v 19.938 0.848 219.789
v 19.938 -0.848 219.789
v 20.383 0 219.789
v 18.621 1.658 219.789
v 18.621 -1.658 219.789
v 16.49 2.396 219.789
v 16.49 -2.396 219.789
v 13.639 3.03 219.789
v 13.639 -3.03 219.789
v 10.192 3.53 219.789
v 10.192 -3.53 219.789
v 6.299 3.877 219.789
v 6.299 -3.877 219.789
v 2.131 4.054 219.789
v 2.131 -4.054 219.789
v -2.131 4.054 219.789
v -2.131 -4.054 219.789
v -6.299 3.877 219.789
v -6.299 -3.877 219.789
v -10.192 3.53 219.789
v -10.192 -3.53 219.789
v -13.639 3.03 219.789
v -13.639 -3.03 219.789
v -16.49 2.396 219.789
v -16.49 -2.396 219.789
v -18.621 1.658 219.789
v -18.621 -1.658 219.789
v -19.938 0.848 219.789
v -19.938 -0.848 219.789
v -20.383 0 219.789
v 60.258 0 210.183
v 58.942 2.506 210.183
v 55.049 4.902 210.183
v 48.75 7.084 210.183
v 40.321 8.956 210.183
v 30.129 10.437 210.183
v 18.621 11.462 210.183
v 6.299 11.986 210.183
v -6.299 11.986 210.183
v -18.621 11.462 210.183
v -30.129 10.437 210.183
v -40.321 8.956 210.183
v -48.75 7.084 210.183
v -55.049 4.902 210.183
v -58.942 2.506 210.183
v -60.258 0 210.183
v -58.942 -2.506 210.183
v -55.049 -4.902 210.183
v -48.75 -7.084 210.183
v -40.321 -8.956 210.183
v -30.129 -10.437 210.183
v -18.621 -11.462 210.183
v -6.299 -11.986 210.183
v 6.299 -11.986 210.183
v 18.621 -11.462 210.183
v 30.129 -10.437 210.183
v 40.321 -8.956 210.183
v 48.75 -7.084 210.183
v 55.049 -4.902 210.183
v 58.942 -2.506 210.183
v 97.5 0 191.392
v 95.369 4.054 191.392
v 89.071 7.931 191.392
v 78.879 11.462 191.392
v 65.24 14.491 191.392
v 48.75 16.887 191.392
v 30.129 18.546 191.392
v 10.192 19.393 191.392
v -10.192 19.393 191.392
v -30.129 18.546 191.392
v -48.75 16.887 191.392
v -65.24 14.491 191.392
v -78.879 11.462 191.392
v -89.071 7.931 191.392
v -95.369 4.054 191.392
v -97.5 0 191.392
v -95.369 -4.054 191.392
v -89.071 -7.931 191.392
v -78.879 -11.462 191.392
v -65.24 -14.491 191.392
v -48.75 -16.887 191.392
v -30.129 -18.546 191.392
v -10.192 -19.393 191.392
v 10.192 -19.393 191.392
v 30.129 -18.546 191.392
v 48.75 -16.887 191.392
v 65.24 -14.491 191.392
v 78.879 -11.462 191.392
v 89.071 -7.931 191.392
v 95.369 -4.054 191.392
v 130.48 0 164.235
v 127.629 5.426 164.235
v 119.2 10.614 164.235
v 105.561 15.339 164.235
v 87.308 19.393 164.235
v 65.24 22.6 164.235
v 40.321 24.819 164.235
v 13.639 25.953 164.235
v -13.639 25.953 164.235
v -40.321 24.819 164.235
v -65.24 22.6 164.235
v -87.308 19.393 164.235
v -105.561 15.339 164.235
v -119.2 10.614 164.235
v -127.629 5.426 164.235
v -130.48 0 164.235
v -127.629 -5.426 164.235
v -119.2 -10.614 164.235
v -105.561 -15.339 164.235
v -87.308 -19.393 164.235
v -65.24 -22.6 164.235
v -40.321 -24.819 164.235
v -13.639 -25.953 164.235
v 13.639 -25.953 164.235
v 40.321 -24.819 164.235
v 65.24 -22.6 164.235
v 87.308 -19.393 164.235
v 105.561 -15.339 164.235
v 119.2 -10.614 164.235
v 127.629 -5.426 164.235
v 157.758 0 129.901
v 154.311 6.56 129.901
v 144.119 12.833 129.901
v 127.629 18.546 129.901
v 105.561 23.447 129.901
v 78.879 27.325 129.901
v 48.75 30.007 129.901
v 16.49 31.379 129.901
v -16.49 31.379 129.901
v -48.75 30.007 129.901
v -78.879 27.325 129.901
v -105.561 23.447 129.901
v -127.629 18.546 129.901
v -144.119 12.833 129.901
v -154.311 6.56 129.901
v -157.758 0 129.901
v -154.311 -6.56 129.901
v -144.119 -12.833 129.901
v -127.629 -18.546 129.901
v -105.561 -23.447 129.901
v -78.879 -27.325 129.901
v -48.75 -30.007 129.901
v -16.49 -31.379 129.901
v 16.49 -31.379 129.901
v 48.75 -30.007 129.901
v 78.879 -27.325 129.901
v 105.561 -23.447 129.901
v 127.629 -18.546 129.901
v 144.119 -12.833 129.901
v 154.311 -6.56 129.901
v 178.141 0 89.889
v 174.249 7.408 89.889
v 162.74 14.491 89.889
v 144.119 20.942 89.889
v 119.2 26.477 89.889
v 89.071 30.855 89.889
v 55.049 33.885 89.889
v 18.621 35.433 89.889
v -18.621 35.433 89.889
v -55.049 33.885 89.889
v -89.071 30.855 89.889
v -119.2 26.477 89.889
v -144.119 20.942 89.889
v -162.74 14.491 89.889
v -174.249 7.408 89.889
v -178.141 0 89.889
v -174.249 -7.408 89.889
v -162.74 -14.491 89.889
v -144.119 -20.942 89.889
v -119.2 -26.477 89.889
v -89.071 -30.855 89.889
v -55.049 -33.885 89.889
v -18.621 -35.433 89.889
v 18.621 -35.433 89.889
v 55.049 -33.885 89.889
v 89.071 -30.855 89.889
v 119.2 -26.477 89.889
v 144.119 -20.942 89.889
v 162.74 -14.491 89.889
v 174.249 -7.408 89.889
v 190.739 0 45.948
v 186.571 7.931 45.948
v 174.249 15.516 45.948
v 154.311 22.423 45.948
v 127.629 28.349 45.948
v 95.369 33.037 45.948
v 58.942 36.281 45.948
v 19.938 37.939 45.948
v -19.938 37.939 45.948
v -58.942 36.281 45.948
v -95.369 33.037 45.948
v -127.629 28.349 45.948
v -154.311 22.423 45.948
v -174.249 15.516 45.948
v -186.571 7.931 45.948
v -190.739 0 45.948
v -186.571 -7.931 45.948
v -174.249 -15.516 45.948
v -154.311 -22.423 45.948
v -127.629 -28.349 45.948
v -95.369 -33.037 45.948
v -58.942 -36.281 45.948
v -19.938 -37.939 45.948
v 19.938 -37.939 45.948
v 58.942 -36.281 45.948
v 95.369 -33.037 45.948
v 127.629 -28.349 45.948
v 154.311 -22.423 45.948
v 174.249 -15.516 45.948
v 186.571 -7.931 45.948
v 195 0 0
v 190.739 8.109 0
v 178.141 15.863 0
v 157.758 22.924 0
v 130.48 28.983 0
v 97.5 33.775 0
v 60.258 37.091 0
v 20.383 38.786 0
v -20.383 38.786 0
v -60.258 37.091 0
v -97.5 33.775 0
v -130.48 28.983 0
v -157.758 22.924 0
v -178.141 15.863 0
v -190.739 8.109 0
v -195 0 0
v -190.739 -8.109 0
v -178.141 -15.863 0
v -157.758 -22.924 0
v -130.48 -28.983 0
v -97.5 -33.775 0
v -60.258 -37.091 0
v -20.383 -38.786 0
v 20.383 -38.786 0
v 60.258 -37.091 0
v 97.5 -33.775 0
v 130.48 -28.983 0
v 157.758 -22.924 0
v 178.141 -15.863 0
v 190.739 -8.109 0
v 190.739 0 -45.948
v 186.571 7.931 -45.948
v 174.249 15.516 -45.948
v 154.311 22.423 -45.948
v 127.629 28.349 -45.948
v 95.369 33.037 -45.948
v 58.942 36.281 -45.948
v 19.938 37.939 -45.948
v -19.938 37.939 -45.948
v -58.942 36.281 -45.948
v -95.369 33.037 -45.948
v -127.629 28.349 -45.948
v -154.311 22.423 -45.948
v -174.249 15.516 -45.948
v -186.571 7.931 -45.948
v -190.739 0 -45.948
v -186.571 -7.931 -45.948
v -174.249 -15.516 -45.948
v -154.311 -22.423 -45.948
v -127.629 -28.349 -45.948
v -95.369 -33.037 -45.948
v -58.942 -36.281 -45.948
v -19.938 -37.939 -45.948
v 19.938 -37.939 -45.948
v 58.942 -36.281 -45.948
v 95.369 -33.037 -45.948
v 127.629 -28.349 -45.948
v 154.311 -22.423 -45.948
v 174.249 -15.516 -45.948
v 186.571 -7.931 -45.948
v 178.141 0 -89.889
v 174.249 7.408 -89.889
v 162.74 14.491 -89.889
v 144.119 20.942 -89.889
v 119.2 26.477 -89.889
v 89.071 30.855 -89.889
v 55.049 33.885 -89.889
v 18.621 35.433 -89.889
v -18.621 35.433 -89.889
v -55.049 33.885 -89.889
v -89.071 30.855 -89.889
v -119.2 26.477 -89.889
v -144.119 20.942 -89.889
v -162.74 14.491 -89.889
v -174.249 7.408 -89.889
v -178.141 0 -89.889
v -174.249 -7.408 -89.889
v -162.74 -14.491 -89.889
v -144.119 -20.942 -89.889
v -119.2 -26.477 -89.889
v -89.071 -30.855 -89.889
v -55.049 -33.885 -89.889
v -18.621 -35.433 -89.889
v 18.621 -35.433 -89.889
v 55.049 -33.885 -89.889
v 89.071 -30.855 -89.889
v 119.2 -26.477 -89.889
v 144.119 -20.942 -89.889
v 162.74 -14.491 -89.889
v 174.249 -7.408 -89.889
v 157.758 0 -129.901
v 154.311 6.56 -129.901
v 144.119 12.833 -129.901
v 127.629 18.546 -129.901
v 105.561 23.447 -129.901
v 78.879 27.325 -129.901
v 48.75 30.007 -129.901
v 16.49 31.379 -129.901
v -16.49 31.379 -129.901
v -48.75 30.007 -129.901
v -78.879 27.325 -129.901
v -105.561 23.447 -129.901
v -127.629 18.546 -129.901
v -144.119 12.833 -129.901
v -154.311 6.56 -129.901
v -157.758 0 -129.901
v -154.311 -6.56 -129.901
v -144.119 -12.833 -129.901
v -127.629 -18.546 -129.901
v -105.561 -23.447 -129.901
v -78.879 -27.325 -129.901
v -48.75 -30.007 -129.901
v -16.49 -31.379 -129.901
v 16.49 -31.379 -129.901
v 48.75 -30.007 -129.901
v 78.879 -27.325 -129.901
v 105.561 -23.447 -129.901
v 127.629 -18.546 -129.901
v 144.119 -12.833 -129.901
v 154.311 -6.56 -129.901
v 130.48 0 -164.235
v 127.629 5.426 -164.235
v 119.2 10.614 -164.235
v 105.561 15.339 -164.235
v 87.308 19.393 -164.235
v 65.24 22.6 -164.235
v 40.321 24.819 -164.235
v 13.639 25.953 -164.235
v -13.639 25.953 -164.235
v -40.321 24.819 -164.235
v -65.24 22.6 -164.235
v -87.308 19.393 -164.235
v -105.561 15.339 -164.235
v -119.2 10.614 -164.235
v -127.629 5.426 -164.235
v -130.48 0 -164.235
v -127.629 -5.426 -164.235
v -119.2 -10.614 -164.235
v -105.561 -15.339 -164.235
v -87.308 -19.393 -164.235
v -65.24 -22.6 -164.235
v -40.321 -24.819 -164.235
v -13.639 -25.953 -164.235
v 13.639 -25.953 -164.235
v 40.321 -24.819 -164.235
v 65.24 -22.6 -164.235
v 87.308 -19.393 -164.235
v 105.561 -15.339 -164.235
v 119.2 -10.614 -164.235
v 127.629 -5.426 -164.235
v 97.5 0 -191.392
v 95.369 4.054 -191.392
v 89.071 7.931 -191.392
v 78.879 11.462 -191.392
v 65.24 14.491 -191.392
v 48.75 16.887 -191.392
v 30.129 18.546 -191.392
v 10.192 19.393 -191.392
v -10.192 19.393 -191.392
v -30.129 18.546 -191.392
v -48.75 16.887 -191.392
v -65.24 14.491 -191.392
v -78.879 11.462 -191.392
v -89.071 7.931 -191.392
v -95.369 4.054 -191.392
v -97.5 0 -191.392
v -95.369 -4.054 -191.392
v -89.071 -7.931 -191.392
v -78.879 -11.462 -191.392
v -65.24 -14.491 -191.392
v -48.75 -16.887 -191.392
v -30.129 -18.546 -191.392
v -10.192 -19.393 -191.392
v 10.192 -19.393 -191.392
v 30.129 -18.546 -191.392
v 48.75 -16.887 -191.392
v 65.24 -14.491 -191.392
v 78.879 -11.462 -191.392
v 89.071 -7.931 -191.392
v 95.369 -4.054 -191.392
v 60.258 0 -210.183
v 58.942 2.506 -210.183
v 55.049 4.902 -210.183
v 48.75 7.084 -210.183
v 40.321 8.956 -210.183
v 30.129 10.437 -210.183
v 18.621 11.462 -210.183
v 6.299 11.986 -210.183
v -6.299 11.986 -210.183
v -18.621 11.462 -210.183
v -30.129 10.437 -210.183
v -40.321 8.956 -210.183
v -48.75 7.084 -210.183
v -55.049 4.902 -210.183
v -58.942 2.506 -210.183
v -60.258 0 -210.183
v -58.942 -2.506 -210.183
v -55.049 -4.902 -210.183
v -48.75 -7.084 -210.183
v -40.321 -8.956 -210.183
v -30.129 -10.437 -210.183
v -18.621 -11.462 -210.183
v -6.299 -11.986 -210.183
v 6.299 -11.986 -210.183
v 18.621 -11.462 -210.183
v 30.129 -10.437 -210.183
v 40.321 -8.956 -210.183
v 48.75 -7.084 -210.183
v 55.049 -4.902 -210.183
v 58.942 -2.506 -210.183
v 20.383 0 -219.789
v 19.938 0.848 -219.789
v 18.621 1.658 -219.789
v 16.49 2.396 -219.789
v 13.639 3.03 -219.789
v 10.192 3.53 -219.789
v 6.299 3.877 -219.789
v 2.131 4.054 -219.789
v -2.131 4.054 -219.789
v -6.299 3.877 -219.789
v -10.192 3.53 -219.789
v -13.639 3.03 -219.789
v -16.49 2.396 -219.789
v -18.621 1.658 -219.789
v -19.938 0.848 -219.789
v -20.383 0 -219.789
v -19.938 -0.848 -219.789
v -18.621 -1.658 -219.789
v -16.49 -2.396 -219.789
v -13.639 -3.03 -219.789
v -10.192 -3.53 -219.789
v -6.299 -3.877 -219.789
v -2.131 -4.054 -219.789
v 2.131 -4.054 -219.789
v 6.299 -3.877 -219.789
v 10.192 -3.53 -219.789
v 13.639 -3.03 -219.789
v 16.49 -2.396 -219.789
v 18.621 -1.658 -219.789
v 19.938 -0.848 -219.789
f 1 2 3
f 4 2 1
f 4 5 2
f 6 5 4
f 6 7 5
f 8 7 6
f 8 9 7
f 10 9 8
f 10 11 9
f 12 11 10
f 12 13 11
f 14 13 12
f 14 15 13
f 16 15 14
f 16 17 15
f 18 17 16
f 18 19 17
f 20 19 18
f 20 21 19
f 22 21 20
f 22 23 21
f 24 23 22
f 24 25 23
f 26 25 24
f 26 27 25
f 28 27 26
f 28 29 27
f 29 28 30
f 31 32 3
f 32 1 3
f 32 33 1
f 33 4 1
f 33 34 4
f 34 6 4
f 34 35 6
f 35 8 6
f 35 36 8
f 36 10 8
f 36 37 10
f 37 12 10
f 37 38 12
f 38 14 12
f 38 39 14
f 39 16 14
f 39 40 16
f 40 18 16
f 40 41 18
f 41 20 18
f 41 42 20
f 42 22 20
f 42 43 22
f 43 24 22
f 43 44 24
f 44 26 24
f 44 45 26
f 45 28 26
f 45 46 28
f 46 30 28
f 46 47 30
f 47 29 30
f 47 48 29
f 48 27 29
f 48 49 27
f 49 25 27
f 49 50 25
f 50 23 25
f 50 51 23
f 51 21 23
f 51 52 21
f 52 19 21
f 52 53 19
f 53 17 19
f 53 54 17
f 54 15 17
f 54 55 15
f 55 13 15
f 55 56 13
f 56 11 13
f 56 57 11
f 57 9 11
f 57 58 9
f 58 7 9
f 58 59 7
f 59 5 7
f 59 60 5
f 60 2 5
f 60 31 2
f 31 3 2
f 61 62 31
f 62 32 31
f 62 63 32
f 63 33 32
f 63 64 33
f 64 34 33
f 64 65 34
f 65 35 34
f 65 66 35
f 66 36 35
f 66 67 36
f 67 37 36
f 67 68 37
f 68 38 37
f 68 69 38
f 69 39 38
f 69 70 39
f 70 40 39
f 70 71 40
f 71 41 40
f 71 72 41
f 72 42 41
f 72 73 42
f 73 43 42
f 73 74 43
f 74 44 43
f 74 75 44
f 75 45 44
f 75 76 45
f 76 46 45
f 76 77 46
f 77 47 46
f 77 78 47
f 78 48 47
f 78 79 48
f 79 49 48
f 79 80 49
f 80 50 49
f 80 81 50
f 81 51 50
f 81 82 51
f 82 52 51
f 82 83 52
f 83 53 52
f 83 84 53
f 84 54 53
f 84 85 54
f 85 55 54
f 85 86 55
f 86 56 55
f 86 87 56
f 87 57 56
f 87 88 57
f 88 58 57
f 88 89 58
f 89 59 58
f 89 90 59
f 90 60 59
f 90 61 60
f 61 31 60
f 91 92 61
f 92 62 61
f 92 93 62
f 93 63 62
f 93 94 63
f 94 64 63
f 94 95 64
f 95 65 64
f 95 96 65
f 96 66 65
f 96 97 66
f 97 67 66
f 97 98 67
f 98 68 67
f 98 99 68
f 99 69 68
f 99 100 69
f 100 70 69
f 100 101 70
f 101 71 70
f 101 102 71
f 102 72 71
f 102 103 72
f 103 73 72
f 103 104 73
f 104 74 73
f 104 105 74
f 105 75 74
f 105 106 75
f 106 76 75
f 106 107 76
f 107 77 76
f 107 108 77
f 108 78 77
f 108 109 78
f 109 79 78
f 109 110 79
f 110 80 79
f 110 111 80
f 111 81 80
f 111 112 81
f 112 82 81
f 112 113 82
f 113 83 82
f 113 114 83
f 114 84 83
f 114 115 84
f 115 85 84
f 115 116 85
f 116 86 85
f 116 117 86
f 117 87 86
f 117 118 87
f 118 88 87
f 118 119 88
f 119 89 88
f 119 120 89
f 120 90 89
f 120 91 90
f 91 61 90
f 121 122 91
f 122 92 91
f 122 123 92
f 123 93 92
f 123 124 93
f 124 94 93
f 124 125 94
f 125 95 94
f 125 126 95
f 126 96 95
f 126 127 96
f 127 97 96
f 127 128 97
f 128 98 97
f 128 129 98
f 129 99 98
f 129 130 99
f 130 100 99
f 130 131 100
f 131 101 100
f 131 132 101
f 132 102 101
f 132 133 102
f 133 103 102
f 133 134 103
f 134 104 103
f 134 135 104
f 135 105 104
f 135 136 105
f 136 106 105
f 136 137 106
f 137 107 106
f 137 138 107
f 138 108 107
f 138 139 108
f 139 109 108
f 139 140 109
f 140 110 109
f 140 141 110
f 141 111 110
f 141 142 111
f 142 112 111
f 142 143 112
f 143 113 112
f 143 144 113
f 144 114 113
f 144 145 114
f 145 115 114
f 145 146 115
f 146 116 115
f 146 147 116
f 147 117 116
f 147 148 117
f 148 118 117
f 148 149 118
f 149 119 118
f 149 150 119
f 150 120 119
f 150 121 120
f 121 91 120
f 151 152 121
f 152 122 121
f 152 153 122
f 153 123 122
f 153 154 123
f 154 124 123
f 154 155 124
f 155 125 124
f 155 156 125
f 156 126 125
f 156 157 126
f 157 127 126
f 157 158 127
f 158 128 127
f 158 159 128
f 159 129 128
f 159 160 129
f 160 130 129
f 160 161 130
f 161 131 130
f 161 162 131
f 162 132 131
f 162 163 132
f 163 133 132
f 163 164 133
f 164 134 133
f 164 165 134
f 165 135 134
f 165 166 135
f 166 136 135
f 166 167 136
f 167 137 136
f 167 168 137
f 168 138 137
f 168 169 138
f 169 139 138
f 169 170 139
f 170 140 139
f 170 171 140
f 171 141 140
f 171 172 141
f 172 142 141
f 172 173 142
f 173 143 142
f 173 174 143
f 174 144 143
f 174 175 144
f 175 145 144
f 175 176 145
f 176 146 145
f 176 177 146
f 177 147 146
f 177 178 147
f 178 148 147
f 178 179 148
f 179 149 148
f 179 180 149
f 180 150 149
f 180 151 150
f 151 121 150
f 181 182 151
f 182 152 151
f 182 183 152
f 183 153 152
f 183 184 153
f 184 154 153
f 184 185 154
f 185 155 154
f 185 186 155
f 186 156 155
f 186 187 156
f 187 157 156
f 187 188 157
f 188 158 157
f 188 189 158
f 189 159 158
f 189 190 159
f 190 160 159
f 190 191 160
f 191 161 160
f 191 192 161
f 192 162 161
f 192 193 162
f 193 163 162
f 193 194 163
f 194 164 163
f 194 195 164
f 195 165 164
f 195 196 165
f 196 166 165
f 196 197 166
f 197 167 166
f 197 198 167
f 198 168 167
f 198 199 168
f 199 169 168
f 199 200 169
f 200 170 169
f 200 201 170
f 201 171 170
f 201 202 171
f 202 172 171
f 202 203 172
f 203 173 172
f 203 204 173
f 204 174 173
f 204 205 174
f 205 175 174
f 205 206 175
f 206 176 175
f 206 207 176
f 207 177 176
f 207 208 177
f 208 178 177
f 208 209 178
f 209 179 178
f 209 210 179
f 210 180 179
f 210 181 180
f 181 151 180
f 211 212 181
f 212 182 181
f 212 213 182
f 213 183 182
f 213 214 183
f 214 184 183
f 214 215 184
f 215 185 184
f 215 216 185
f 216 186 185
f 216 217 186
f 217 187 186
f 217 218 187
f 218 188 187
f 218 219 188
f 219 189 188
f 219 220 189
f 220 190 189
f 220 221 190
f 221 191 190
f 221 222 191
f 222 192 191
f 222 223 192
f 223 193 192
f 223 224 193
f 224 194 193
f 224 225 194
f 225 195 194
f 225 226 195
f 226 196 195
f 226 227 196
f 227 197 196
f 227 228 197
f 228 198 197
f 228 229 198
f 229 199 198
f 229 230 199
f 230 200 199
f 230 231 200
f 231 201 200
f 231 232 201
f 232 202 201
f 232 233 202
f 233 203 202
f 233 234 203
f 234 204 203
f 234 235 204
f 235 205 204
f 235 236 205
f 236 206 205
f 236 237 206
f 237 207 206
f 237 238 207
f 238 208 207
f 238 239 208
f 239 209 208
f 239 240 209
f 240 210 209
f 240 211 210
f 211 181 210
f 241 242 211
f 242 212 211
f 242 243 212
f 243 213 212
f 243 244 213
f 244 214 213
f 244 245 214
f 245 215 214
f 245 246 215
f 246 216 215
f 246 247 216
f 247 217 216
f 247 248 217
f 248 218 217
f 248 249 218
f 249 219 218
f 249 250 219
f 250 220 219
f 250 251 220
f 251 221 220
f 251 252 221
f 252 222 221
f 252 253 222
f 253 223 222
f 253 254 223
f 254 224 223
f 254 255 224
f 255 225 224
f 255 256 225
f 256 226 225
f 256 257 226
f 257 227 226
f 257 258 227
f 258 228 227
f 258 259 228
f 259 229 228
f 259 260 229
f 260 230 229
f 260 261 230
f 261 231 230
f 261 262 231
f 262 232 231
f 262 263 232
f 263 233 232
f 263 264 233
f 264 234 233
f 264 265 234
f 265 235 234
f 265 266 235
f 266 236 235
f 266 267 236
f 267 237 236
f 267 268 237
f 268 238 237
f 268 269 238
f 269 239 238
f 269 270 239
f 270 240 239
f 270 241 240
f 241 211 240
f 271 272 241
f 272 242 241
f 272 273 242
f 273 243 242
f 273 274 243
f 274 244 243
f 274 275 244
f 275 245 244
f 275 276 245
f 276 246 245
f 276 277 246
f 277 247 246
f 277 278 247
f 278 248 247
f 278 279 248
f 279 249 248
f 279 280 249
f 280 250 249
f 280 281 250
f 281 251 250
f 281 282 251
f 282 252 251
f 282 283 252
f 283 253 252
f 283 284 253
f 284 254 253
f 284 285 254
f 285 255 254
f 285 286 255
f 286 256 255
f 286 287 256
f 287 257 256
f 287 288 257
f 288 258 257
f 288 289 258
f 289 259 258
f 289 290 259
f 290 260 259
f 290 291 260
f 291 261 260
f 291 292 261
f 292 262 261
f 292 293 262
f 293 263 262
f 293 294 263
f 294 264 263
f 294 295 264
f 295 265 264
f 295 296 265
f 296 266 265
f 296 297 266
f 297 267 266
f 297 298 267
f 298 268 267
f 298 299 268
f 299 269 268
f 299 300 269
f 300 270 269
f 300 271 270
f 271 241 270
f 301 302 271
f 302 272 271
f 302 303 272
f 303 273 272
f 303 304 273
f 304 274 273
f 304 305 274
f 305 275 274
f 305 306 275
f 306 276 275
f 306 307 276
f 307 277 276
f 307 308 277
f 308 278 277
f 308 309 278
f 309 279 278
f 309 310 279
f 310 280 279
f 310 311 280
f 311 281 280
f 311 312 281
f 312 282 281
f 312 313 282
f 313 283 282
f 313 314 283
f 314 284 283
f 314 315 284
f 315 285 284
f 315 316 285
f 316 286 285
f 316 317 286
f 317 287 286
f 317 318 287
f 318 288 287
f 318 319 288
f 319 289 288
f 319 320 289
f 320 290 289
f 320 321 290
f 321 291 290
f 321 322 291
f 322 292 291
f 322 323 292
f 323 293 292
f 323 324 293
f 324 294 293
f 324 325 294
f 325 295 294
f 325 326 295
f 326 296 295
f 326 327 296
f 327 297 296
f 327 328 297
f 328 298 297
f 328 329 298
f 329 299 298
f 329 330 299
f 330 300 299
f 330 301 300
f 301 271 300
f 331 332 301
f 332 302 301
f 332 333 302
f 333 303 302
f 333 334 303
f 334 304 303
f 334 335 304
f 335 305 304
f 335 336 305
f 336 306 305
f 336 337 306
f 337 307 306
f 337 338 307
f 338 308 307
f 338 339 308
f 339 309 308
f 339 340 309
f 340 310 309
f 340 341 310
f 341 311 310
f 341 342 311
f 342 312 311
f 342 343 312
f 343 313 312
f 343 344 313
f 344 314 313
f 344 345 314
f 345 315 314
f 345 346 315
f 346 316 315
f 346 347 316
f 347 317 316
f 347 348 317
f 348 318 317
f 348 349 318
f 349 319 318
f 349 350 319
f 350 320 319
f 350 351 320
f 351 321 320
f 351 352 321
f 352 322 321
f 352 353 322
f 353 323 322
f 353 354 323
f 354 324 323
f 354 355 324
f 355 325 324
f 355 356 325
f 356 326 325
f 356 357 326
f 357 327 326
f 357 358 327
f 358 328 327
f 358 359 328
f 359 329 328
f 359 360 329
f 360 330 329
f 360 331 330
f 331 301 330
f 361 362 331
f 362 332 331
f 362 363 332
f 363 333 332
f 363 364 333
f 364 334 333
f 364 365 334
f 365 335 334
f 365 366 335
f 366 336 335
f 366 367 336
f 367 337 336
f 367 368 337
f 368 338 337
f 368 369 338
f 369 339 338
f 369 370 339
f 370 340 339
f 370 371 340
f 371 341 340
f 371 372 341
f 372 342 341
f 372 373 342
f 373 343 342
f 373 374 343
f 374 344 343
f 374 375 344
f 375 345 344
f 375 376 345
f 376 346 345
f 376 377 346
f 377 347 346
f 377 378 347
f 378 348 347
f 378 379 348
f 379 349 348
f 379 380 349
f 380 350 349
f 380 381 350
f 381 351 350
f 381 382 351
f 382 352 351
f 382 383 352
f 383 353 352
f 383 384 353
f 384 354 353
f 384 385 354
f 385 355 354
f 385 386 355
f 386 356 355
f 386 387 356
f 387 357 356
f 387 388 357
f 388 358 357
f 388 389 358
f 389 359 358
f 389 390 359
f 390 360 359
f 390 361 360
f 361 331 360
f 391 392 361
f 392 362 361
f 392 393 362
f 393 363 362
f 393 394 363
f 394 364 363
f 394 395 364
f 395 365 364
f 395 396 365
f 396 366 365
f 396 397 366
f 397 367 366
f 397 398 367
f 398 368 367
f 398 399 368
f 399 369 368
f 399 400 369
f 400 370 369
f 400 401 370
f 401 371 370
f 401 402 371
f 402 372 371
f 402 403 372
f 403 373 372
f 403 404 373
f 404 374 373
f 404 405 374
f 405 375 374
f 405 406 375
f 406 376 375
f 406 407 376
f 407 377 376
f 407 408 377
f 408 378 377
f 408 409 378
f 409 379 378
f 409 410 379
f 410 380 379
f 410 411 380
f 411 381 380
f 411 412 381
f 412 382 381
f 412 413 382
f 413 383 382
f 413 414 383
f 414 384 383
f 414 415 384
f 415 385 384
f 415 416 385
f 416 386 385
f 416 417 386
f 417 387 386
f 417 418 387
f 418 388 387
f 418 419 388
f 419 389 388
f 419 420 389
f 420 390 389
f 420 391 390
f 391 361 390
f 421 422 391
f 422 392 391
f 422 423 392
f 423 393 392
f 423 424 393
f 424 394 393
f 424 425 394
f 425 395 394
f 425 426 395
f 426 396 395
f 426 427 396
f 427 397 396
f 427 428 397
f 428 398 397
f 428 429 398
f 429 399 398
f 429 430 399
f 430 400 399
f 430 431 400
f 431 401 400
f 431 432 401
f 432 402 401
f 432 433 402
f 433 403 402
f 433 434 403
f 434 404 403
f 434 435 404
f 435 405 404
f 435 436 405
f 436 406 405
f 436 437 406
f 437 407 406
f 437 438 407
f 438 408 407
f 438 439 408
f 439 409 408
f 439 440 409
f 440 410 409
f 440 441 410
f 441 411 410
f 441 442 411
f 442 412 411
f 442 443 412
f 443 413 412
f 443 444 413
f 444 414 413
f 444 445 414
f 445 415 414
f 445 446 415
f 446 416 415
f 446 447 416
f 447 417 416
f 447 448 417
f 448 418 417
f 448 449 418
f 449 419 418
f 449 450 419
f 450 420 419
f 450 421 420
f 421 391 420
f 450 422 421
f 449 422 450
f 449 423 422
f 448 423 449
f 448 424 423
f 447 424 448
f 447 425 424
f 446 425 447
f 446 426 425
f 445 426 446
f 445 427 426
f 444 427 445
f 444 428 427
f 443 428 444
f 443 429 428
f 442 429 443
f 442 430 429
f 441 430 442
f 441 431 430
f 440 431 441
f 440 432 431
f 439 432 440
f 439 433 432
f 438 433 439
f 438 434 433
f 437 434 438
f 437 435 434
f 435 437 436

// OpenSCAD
// Generated by SolidPython 1.0.1 on 2020-07-29 00:46:51


scale(v = [15, 3, 17]) {
	sphere(r = 13);
}
/***********************************************
*********      SolidPython code:      **********
************************************************
 
# import packages: SolidPython
from solid import *
from solid.utils import *
from itertools import chain, combinations, permutations


class Resize:

    def __init__(self, scad_file):
        self.scad_file = scad_file
        #self.scad_file = import_scad(scad_file)
        # cone/cylinder param:
        self.r1 = 0
        self.r2 = 0
        self.h = 0
        # rectangular prism param:
        self.w = 0
        self.l = 0
        # ellipse param:
        self.r = 0

    # import OpenScad code (file name corresponds to shape)


    # classify shape + parameters
    def assign(self, param1, param2, param3):
        if self.scad_file == 'cone.scad':
            self.r1 = param1
            self.r2 = param2
            self.h = param3
        elif self.scad_file == 'cylinder.scad':
            self.r1 = param1
            self.r2 = param2
            self.h = param3
        elif self.scad_file == 'rectangularPrism.scad':
            self.h = param1
            self.l = param2
            self.w = param3
        else:
            self.r = param1
            self.h = param2

    # resize parameters
    def iterate(self):
        x = range(3, 20, 2)
        i = 1
        if self.scad_file == 'cone.scad':
            tempList = list(permutations(x, 2))
            for temp in tempList:
                param1 = temp[0]
                param2 = temp[1]
                filepath = 'produced_scad_files/' + 'cone' + str(param1) + '_' + str(param2) + '_' + '.scad'
                scad_render_to_file(cylinder(h=param1, r1=param2, r2=0), filepath)

        elif self.scad_file == 'cylinder.scad':
            tempList = list(permutations(x, 3))
            for temp in tempList:
                param1 = temp[0]
                param2 = temp[1]
                filepath = 'produced_scad_files/' + 'cylinder' + str(param1) + '_' + str(param2) + '_' + '.scad'
                scad_render_to_file(cylinder(h=param1, r1=param2, r2=param2), filepath)

        elif self.scad_file == 'rectangularPrism.scad':
            tempList = list(permutations(x, 3))
            for temp in tempList:
                param1 = temp[0]
                param2 = temp[1]
                param3 = temp[2]
                filepath = 'produced_scad_files/' + 'rectangularPrism' + str(param1) + '_' + str(param2) + '_' + str(
                    param3) + '.scad'
                scad_render_to_file(cube(size=(param1, param2, param3)), filepath)

        elif self.scad_file == 'ellipse.scad':
            tempList = list(permutations(x, 4))
            for temp in tempList:
                param1 = temp[0]
                param2 = temp[1]
                param3 = temp[2]
                param4 = temp[3]
                filepath = 'produced_scad_files/' + 'ellipse' + str(param1) + '_' + str(param2) + '_' + str(param3) + '_' + str(param4) + '.scad'
                scad_render_to_file(scale([param1, param2, param3])(sphere(r=param4)), filepath)

    def render_to_scadfile(self):
        scad_render_to_file(scad, 'example.scad') 
 
************************************************/
